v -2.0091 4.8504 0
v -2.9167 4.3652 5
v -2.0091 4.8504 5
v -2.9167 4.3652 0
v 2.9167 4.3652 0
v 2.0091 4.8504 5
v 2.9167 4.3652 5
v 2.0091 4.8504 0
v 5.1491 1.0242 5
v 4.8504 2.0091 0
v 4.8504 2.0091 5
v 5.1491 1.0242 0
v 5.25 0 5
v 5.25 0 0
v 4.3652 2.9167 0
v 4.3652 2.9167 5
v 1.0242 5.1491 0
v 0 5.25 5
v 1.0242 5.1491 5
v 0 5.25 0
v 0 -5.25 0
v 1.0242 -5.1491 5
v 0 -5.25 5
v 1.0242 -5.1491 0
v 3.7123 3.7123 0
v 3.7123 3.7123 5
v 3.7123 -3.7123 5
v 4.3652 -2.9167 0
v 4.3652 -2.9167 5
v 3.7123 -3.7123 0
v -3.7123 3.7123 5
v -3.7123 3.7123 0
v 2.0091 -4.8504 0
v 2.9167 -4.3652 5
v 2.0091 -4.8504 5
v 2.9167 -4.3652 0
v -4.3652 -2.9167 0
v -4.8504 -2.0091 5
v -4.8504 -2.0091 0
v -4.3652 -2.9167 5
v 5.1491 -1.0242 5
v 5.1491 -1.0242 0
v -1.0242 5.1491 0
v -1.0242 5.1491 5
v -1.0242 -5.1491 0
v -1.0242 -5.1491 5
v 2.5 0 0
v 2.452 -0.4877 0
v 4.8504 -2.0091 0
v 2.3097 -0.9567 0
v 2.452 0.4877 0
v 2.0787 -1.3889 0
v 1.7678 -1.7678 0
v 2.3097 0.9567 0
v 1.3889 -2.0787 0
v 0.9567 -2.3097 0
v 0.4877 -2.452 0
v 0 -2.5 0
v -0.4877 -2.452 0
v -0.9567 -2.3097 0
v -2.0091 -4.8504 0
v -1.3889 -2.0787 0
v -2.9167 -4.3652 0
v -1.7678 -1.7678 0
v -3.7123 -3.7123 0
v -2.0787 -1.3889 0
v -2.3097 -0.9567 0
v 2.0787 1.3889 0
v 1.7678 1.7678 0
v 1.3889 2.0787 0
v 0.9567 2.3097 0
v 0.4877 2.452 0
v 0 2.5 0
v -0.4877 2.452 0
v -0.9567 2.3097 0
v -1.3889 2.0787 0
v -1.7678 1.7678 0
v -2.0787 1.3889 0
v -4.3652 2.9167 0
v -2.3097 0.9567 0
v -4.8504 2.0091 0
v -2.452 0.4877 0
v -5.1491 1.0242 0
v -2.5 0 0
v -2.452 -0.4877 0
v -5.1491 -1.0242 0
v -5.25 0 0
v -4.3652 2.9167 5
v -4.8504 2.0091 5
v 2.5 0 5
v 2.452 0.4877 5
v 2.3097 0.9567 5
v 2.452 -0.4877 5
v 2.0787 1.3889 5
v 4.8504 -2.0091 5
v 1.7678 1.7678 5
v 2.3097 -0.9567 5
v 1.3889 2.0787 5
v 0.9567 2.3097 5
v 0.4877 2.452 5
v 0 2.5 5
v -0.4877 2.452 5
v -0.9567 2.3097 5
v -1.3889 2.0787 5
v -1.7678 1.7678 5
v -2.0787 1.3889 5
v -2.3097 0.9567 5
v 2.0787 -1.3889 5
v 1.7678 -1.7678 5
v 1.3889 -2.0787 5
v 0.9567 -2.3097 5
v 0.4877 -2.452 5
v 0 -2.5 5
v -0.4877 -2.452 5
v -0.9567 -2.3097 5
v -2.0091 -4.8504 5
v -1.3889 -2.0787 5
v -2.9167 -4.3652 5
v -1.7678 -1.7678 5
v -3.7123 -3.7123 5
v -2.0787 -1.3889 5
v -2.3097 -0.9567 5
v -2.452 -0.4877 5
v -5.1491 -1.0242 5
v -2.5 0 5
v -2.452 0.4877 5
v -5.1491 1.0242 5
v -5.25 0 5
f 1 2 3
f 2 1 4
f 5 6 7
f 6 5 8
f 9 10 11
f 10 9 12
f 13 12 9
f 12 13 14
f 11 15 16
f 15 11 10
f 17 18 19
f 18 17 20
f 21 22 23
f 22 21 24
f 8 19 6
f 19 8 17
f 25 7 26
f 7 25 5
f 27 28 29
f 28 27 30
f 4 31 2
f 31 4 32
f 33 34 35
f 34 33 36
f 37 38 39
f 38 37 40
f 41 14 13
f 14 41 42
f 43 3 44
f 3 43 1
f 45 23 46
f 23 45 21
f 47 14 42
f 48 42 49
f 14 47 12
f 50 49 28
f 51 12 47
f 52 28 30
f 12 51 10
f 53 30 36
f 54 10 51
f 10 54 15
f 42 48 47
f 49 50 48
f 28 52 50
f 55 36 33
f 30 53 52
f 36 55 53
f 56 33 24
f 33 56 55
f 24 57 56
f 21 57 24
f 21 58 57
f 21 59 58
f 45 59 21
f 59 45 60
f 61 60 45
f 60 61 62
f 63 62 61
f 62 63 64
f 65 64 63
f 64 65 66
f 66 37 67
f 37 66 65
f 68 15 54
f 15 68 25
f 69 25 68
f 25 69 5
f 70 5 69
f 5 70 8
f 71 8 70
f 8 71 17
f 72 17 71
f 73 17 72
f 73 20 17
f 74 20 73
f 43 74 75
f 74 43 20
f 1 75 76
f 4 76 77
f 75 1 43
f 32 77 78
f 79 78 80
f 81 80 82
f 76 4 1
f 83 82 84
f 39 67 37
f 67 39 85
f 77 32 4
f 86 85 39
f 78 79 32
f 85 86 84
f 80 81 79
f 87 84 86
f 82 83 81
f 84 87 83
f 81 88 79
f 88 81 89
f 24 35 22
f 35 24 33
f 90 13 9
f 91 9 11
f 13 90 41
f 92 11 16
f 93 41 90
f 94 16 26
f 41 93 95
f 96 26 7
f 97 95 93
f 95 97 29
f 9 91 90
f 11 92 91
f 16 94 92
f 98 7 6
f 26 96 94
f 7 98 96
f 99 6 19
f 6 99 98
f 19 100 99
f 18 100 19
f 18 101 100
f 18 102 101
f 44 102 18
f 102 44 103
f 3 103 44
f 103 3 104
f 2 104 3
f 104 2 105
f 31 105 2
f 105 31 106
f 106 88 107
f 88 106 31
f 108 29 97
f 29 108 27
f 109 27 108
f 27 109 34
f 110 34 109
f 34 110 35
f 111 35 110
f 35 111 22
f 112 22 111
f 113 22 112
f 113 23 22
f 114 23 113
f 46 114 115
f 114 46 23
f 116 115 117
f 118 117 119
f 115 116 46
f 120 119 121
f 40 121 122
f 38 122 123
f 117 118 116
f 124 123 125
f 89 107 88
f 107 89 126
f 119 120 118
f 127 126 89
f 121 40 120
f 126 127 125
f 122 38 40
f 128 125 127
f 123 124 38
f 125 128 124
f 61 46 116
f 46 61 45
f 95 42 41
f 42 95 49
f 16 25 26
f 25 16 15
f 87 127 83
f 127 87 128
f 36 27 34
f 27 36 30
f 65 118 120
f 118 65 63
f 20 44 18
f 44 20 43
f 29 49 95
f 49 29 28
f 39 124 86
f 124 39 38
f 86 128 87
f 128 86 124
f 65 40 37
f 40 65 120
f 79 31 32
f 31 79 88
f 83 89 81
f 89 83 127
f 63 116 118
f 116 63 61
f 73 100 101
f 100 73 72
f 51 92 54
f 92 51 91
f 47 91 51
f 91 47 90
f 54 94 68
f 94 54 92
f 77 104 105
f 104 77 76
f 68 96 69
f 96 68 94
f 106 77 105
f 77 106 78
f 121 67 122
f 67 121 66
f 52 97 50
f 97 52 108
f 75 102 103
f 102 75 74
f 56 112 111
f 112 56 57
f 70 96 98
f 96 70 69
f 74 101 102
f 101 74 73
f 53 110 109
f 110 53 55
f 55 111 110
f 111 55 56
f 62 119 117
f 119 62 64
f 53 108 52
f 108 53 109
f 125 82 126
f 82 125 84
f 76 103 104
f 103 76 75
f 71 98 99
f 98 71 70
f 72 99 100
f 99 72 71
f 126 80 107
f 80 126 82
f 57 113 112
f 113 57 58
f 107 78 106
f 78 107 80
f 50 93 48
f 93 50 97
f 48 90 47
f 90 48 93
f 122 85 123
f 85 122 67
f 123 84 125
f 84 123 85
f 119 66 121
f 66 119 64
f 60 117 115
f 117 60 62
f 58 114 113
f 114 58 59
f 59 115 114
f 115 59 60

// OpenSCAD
$fn=32;
difference() {
  cylinder(r=5.25,h=5);
  translate([0,0,-1]) cylinder(r=2.5,h=7);
}
